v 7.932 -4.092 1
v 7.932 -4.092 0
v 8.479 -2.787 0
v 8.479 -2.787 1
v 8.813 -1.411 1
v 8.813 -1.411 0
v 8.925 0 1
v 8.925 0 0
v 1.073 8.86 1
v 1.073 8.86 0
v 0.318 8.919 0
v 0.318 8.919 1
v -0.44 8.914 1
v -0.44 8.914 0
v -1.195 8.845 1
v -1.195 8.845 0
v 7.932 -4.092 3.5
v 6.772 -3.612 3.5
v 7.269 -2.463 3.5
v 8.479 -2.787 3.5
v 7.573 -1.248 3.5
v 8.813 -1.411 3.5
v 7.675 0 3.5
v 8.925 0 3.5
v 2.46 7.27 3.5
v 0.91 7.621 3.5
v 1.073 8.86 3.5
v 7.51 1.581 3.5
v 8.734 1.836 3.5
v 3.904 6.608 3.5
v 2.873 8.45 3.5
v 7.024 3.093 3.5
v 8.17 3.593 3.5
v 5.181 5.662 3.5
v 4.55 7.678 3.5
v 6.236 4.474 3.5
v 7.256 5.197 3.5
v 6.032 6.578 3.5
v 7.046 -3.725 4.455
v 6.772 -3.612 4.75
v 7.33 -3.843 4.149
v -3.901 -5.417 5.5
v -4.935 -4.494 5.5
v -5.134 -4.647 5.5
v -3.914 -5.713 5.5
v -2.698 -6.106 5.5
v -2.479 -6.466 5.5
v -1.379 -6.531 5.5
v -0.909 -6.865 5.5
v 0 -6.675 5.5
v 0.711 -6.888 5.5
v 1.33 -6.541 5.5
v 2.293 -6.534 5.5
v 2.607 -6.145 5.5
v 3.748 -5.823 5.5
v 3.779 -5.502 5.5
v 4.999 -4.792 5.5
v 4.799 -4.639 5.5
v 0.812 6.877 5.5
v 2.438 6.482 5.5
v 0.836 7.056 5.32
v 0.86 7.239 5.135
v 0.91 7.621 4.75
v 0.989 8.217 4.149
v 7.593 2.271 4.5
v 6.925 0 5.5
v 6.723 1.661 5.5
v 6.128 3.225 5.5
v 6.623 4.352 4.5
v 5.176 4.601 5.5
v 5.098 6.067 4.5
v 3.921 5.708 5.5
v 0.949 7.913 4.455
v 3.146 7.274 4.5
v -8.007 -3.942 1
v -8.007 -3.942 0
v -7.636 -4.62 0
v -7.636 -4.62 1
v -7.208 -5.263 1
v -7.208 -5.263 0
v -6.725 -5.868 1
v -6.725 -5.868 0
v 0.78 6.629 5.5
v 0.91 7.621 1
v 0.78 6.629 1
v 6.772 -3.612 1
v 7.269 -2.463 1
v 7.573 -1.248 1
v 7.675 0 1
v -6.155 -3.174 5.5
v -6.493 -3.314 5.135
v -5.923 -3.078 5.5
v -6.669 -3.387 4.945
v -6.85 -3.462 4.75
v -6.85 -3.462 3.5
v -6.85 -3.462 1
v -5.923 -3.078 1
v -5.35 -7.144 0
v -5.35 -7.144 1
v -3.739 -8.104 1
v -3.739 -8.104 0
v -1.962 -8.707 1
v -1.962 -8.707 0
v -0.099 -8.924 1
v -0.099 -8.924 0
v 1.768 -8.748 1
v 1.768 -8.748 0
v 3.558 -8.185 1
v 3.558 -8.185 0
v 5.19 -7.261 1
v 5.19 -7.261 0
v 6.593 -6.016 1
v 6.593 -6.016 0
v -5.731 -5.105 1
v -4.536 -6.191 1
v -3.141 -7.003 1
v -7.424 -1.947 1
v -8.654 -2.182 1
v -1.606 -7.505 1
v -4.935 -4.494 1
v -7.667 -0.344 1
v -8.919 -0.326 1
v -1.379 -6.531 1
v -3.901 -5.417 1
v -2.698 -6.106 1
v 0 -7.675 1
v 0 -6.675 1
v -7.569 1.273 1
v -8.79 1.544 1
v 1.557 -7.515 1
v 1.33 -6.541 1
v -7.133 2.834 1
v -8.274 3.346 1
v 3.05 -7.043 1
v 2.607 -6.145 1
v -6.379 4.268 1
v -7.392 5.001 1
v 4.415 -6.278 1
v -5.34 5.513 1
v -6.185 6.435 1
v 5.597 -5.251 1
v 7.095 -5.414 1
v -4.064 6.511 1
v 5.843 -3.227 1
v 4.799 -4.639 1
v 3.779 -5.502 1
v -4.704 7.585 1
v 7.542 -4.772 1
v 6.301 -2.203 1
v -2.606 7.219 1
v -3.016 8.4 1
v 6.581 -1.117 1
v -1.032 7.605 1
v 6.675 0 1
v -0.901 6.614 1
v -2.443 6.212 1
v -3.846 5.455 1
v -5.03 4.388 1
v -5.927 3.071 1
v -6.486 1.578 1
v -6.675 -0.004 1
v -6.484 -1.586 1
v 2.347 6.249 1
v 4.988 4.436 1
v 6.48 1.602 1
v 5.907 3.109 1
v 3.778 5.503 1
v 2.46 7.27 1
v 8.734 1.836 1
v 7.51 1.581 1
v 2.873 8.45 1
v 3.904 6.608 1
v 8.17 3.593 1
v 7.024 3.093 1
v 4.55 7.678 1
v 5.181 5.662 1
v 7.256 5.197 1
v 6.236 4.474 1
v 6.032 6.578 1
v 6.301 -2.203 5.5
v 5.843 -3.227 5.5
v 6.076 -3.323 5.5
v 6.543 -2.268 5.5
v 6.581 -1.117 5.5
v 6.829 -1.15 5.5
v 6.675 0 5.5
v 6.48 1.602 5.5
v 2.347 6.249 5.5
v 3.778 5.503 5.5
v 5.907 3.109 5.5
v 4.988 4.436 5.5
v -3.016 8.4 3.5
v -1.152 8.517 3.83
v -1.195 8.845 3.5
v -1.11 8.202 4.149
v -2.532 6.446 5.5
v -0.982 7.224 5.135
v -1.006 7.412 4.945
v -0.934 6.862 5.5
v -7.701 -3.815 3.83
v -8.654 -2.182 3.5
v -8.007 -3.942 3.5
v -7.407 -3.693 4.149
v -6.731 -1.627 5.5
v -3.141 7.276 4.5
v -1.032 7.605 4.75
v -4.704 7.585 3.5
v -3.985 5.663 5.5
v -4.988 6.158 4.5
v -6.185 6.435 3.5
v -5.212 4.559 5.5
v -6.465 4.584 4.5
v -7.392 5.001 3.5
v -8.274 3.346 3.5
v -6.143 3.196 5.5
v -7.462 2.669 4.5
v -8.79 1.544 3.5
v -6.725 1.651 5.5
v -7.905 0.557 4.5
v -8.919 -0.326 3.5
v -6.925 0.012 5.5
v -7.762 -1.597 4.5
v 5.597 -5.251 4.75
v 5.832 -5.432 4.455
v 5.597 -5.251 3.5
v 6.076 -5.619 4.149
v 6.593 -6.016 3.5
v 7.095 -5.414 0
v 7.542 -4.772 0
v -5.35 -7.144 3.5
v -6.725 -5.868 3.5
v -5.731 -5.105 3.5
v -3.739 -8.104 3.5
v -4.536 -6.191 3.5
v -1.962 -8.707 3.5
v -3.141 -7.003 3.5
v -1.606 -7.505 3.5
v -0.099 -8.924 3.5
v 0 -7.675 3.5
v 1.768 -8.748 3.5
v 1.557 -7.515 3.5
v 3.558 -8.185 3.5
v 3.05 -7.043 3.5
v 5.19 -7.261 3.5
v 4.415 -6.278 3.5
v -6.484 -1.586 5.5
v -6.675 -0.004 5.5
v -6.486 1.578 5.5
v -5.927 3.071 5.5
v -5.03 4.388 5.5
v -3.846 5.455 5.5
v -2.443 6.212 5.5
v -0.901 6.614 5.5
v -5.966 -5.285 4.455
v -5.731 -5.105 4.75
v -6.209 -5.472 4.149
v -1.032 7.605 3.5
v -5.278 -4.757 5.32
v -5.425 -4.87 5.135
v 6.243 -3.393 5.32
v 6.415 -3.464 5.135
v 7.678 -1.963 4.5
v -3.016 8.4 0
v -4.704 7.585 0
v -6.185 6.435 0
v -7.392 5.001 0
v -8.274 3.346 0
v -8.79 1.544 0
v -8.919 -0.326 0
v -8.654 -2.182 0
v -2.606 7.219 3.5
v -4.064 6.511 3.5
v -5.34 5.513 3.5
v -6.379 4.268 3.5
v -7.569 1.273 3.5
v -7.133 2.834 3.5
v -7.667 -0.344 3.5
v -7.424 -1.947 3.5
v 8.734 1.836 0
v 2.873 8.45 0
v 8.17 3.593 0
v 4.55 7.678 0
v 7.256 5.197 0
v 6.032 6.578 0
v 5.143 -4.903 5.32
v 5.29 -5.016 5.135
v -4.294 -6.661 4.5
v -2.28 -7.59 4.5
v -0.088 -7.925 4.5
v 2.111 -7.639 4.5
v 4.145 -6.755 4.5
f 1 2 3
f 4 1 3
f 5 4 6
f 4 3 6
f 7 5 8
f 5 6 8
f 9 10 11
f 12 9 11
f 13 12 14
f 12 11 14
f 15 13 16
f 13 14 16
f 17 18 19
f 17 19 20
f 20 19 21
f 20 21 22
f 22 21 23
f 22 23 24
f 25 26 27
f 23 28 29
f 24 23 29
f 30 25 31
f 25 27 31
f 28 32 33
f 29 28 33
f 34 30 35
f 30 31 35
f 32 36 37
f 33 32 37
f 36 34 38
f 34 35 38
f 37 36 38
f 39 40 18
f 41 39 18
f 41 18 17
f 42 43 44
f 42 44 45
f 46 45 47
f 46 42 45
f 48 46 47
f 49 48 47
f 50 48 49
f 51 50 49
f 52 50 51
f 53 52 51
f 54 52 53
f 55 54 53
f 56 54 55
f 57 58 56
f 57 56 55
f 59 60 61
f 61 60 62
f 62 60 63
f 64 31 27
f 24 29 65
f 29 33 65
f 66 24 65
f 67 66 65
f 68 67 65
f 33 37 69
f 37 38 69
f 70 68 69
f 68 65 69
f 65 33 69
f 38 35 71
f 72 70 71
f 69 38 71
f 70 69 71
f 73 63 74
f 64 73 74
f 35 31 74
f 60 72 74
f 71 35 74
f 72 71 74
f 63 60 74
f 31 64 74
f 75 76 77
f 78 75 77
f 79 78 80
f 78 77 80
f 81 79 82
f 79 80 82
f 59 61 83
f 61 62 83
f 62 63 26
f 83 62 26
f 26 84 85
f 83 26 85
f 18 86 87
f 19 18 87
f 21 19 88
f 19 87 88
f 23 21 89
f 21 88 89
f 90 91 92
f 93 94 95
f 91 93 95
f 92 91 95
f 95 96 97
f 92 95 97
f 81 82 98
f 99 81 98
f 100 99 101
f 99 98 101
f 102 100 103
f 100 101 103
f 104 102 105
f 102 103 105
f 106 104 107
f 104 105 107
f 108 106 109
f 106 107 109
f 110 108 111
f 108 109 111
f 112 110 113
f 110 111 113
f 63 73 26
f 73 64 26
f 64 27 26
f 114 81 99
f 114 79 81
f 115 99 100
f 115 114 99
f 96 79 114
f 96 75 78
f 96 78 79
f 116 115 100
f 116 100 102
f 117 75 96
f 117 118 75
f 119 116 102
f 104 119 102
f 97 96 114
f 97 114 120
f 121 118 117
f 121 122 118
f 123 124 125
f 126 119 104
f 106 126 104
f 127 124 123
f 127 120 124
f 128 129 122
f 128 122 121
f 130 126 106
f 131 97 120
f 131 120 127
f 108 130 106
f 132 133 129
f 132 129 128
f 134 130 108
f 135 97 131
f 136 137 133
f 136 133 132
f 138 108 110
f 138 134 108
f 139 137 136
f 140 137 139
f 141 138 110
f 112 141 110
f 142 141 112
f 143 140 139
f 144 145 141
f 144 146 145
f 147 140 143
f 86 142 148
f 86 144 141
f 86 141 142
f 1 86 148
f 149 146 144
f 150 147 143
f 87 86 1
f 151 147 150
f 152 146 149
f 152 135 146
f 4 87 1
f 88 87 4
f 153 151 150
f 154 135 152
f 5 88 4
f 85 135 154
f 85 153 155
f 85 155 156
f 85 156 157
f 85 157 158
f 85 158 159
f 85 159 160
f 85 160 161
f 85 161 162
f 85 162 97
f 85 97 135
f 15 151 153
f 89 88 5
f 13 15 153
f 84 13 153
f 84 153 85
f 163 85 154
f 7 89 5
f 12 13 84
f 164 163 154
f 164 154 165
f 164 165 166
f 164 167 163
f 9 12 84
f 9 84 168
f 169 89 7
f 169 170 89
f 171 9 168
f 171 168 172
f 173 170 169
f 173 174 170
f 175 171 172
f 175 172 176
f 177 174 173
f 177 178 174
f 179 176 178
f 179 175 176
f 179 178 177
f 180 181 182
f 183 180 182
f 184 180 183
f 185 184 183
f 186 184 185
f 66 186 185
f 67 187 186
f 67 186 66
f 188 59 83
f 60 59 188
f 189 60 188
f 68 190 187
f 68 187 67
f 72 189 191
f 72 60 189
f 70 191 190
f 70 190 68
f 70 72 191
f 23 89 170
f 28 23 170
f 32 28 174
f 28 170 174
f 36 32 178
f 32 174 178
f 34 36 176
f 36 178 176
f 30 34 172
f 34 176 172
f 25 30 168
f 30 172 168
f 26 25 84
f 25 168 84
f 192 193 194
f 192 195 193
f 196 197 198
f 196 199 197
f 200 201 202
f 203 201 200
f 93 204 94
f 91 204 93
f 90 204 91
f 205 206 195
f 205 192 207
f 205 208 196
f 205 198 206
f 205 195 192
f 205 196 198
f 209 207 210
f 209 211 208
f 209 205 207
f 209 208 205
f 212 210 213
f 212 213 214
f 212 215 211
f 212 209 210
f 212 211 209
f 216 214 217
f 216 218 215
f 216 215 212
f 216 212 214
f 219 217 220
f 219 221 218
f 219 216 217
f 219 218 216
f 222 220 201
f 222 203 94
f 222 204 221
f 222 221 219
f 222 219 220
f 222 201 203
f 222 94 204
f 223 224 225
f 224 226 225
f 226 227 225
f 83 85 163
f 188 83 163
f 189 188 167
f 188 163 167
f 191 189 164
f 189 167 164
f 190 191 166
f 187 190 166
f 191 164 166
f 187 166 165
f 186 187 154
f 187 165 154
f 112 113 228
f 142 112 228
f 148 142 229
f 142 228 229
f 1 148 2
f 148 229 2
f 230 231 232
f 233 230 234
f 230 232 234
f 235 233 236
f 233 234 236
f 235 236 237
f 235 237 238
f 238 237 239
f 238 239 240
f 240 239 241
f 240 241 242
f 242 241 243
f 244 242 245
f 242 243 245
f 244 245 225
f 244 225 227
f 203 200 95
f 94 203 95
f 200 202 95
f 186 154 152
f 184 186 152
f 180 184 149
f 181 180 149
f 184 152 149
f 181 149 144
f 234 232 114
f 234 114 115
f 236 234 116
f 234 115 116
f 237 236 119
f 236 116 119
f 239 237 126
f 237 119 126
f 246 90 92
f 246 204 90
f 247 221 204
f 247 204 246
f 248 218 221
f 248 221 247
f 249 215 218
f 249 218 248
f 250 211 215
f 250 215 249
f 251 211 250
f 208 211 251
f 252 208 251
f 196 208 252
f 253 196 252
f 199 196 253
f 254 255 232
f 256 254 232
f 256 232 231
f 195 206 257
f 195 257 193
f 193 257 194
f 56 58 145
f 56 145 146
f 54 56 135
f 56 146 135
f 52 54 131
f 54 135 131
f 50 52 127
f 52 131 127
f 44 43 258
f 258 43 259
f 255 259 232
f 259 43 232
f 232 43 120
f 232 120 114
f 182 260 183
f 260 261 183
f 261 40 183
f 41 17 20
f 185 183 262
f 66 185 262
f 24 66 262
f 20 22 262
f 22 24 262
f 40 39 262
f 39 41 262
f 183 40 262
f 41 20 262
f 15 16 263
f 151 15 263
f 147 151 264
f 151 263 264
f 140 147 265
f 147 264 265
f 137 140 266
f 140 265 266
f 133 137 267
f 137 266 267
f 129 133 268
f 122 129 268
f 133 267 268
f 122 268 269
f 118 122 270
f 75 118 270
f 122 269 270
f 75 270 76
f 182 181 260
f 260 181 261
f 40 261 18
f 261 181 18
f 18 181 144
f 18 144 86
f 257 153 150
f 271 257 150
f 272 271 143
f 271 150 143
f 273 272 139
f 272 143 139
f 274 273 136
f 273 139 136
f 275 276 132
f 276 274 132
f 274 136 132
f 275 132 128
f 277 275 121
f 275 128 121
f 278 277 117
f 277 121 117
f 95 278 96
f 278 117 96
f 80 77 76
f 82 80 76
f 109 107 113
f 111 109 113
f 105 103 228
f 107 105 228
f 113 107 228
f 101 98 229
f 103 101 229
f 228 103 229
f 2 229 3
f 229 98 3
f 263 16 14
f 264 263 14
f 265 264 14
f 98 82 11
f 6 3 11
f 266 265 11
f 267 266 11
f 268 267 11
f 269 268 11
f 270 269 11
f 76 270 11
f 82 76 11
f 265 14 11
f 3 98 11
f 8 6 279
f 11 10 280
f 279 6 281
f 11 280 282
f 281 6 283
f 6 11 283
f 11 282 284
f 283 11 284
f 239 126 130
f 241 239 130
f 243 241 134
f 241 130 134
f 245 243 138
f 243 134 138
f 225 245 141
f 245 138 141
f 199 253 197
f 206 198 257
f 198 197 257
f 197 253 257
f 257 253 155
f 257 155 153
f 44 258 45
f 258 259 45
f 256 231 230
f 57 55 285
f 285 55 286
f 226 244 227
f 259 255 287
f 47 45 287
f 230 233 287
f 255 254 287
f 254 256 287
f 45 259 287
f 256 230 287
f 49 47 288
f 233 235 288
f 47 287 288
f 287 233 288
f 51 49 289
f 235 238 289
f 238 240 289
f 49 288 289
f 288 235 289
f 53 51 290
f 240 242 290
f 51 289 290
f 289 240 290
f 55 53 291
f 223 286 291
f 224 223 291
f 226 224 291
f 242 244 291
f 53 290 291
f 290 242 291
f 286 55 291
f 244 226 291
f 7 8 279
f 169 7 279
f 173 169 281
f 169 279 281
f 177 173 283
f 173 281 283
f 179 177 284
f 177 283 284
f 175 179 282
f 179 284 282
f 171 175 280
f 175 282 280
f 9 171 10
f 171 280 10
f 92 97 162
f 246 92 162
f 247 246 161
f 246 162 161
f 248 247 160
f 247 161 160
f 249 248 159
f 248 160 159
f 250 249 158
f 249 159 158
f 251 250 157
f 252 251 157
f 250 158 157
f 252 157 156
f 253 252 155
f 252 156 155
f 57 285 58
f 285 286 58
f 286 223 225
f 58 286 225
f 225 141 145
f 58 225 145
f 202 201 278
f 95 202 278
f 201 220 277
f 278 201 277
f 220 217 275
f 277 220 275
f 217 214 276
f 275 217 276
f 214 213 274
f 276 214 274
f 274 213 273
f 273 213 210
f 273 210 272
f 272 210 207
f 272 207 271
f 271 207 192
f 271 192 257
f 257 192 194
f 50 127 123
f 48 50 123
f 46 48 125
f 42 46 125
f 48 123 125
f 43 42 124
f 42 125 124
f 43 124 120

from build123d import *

# Parameters (mm, degrees)
F1_DEPTH = 1
F2_DEPTH = 5.5
F3_START = 3.5
F3_DEPTH = 2
F4_SIZE  = 1.99999


# Not quite as in the source:
# - a fillet or chamfer is up to 0.001 mm smaller than in the source, because OpenCascade refuses the exact size


with BuildPart() as f1:
    # F0 (on Top) → F1 (new body)
    with BuildSketch(Plane.XY):
        with BuildLine():
            ThreePointArc((6.675, 0), (4.9879380463, 4.4357749094), (0.7795396115, 6.6293244749))
            ThreePointArc((0.7795396115, 6.6293244749), (-0.0613991479, 6.6747176079), (-0.9013605528, 6.6138622721))
            ThreePointArc((-0.9013605528, 6.6138622721), (-5.9267464923, 3.0707166942), (-5.9228974074, -3.0781343864))
            ThreePointArc((-5.9228974074, -3.0781343864), (-5.4750931221, -3.8182430914), (-4.9353373694, -4.4942263016))
            ThreePointArc((-4.9353373694, -4.4942263016), (-2.6978384344, -6.1055133103), (0, -6.675))
            ThreePointArc((0, -6.675), (2.6066720123, -6.1449886916), (4.7993917719, -4.6391231521))
            ThreePointArc((4.7993917719, -4.6391231521), (5.3679142179, -3.9675082796), (5.8431534535, -3.2269463459))
            ThreePointArc((5.8431534535, -3.2269463459), (6.4636937699, -1.6662196281), (6.675, 0))
        make_face()
        with BuildLine():
            Line((-5.9228974074, -3.0781343864), (-6.849796149, -3.4620684161))
            ThreePointArc((-6.849796149, -3.4620684161), (-6.3438696558, -4.3198313381), (-5.7311395238, -5.1048667718))
            Line((-5.7311395238, -5.1048667718), (-4.9353373694, -4.4942263016))
            ThreePointArc((-4.9353373694, -4.4942263016), (-5.4750931221, -3.8182430914), (-5.9228974074, -3.0781343864))
        make_face()
        with BuildLine():
            Line((-6.849796149, -3.4620684161), (-8.0074646458, -3.9415904082))
            ThreePointArc((-8.0074646458, -3.9415904082), (-7.4289702623, -4.9463143695), (-6.7251178515, -5.8675731681))
            Line((-6.7251178515, -5.8675731681), (-5.7311395238, -5.1048667718))
            ThreePointArc((-5.7311395238, -5.1048667718), (-6.3438696558, -4.3198313381), (-6.849796149, -3.4620684161))
        make_face()
        with BuildLine():
            Line((0.9100766885, 7.6208520141), (1.0732446043, 8.8602353817))
            ThreePointArc((1.0732446043, 8.8602353817), (-0.0613988555, 8.9247888031), (-1.1950467583, 8.8446304754))
            Line((-1.1950467583, 8.8446304754), (-1.0318879198, 7.6053160566))
            ThreePointArc((-1.0318879198, 7.6053160566), (-0.0613989862, 7.6747544042), (0.9100766885, 7.6208520141))
        make_face()
        with BuildLine():
            Line((-1.0318879198, 7.6053160566), (-1.1950467583, 8.8446304754))
            ThreePointArc((-1.1950467583, 8.8446304754), (-7.8767642568, 4.196690344), (-8.0074646458, -3.9415904082))
            Line((-8.0074646458, -3.9415904082), (-6.849796149, -3.4620684161))
            ThreePointArc((-6.849796149, -3.4620684161), (-6.7935252783, 3.5712237809), (-1.0318879198, 7.6053160566))
        make_face()
        with BuildLine():
            ThreePointArc((-6.7251178515, -5.8675731681), (-3.6937470456, -8.1247681667), (0, -8.925))
            Line((0, -8.925), (0, -7.675))
            ThreePointArc((0, -7.675), (-3.1405232467, -7.0030521015), (-5.7311395238, -5.1048667718))
            Line((-5.7311395238, -5.1048667718), (-6.7251178515, -5.8675731681))
        make_face()
        with BuildLine():
            ThreePointArc((0, -8.925), (3.6032793864, -8.1652925645), (6.5931272563, -6.0155047986))
            Line((6.5931272563, -6.0155047986), (5.597241272, -5.2513346059))
            ThreePointArc((5.597241272, -5.2513346059), (3.0497239137, -7.043068156), (0, -7.675))
            Line((0, -7.675), (0, -8.925))
        make_face()
        with BuildLine():
            ThreePointArc((6.5931272563, -6.0155047986), (7.3257881446, -5.0978871172), (7.9316419101, -4.0920265895))
            Line((7.9316419101, -4.0920265895), (6.7720820443, -3.6117211667))
            ThreePointArc((6.7720820443, -3.6117211667), (6.2387597231, -4.4702910551), (5.597241272, -5.2513346059))
            Line((5.597241272, -5.2513346059), (6.5931272563, -6.0155047986))
        make_face()
        with BuildLine():
            ThreePointArc((7.9316419101, -4.0920265895), (8.6731058176, -2.1054359349), (8.925, 0))
            ThreePointArc((8.925, 0), (6.679608263, 5.9193292233), (1.0732446043, 8.8602353817))
            Line((1.0732446043, 8.8602353817), (0.9100766885, 7.6208520141))
            ThreePointArc((0.9100766885, 7.6208520141), (5.7397937064, 5.0951342679), (7.675, 0))
            ThreePointArc((7.675, 0), (7.4458496725, -1.8614369866), (6.7720820443, -3.6117211667))
            Line((6.7720820443, -3.6117211667), (7.9316419101, -4.0920265895))
        make_face()
        with BuildLine():
            ThreePointArc((5.597241272, -5.2513346059), (6.2387597231, -4.4702910551), (6.7720820443, -3.6117211667))
            Line((6.7720820443, -3.6117211667), (5.8431534535, -3.2269463459))
            ThreePointArc((5.8431534535, -3.2269463459), (5.3679142179, -3.9675082796), (4.7993917719, -4.6391231521))
            Line((4.7993917719, -4.6391231521), (5.597241272, -5.2513346059))
        make_face()
        with BuildLine():
            Line((0.7795396115, 6.6293244749), (0.9100766885, 7.6208520141))
            ThreePointArc((0.9100766885, 7.6208520141), (-0.0613989862, 7.6747544042), (-1.0318879198, 7.6053160566))
            Line((-1.0318879198, 7.6053160566), (-0.9013605528, 6.6138622721))
            ThreePointArc((-0.9013605528, 6.6138622721), (-0.0613991479, 6.6747176079), (0.7795396115, 6.6293244749))
        make_face()
    extrude(amount=F1_DEPTH)

    # F0 (on Top) → F2 (join)
    with BuildSketch(Plane.XY):
        with BuildLine():
            Line((-0.9013605528, 6.6138622721), (-1.0318879198, 7.6053160566))
            ThreePointArc((-1.0318879198, 7.6053160566), (-6.7935252783, 3.5712237809), (-6.849796149, -3.4620684161))
            Line((-6.849796149, -3.4620684161), (-5.9228974074, -3.0781343864))
            ThreePointArc((-5.9228974074, -3.0781343864), (-5.9267464923, 3.0707166942), (-0.9013605528, 6.6138622721))
        make_face()
        with BuildLine():
            ThreePointArc((7.675, 0), (5.7397937064, 5.0951342679), (0.9100766885, 7.6208520141))
            Line((0.9100766885, 7.6208520141), (0.7795396115, 6.6293244749))
            ThreePointArc((0.7795396115, 6.6293244749), (4.9879380463, 4.4357749094), (6.675, 0))
            ThreePointArc((6.675, 0), (6.4636937699, -1.6662196281), (5.8431534535, -3.2269463459))
            Line((5.8431534535, -3.2269463459), (6.7720820443, -3.6117211667))
            ThreePointArc((6.7720820443, -3.6117211667), (7.4458496725, -1.8614369866), (7.675, 0))
        make_face()
        with BuildLine():
            ThreePointArc((-5.7311395238, -5.1048667718), (-3.1405232467, -7.0030521015), (0, -7.675))
            Line((0, -7.675), (0, -6.675))
            ThreePointArc((0, -6.675), (-2.6978384344, -6.1055133103), (-4.9353373694, -4.4942263016))
            Line((-4.9353373694, -4.4942263016), (-5.7311395238, -5.1048667718))
        make_face()
        with BuildLine():
            ThreePointArc((0, -7.675), (3.0497239137, -7.043068156), (5.597241272, -5.2513346059))
            Line((5.597241272, -5.2513346059), (4.7993917719, -4.6391231521))
            ThreePointArc((4.7993917719, -4.6391231521), (2.6066720123, -6.1449886916), (0, -6.675))
            Line((0, -6.675), (0, -7.675))
        make_face()
    extrude(amount=F2_DEPTH)

    # F0 (on Top) → F3 (join)
    with BuildSketch(Plane.XY.offset(F3_START)):
        with BuildLine():
            Line((-1.0318879198, 7.6053160566), (-1.1950467583, 8.8446304754))
            ThreePointArc((-1.1950467583, 8.8446304754), (-7.8767642568, 4.196690344), (-8.0074646458, -3.9415904082))
            Line((-8.0074646458, -3.9415904082), (-6.849796149, -3.4620684161))
            ThreePointArc((-6.849796149, -3.4620684161), (-6.7935252783, 3.5712237809), (-1.0318879198, 7.6053160566))
        make_face()
        with BuildLine():
            ThreePointArc((7.9316419101, -4.0920265895), (8.6731058176, -2.1054359349), (8.925, 0))
            ThreePointArc((8.925, 0), (6.679608263, 5.9193292233), (1.0732446043, 8.8602353817))
            Line((1.0732446043, 8.8602353817), (0.9100766885, 7.6208520141))
            ThreePointArc((0.9100766885, 7.6208520141), (5.7397937064, 5.0951342679), (7.675, 0))
            ThreePointArc((7.675, 0), (7.4458496725, -1.8614369866), (6.7720820443, -3.6117211667))
            Line((6.7720820443, -3.6117211667), (7.9316419101, -4.0920265895))
        make_face()
        with BuildLine():
            ThreePointArc((0, -8.925), (3.6032793864, -8.1652925645), (6.5931272563, -6.0155047986))
            Line((6.5931272563, -6.0155047986), (5.597241272, -5.2513346059))
            ThreePointArc((5.597241272, -5.2513346059), (3.0497239137, -7.043068156), (0, -7.675))
            Line((0, -7.675), (0, -8.925))
        make_face()
        with BuildLine():
            ThreePointArc((-6.7251178515, -5.8675731681), (-3.6937470456, -8.1247681667), (0, -8.925))
            Line((0, -8.925), (0, -7.675))
            ThreePointArc((0, -7.675), (-3.1405232467, -7.0030521015), (-5.7311395238, -5.1048667718))
            Line((-5.7311395238, -5.1048667718), (-6.7251178515, -5.8675731681))
        make_face()
    extrude(amount=F3_DEPTH)

    # F4 (size 2 in the source; OpenCascade refuses exactly that, so slightly less here)
    f4_edges = [f1.edges().sort_by_distance(p)[0] for p in [
        (-7.876764, 4.19669, 5.5),
        (-0.099128, -8.924449, 5.5),
        (7.887475, 4.176525, 5.5),
    ]]
    chamfer(f4_edges, length=F4_SIZE)


solid = f1.part
